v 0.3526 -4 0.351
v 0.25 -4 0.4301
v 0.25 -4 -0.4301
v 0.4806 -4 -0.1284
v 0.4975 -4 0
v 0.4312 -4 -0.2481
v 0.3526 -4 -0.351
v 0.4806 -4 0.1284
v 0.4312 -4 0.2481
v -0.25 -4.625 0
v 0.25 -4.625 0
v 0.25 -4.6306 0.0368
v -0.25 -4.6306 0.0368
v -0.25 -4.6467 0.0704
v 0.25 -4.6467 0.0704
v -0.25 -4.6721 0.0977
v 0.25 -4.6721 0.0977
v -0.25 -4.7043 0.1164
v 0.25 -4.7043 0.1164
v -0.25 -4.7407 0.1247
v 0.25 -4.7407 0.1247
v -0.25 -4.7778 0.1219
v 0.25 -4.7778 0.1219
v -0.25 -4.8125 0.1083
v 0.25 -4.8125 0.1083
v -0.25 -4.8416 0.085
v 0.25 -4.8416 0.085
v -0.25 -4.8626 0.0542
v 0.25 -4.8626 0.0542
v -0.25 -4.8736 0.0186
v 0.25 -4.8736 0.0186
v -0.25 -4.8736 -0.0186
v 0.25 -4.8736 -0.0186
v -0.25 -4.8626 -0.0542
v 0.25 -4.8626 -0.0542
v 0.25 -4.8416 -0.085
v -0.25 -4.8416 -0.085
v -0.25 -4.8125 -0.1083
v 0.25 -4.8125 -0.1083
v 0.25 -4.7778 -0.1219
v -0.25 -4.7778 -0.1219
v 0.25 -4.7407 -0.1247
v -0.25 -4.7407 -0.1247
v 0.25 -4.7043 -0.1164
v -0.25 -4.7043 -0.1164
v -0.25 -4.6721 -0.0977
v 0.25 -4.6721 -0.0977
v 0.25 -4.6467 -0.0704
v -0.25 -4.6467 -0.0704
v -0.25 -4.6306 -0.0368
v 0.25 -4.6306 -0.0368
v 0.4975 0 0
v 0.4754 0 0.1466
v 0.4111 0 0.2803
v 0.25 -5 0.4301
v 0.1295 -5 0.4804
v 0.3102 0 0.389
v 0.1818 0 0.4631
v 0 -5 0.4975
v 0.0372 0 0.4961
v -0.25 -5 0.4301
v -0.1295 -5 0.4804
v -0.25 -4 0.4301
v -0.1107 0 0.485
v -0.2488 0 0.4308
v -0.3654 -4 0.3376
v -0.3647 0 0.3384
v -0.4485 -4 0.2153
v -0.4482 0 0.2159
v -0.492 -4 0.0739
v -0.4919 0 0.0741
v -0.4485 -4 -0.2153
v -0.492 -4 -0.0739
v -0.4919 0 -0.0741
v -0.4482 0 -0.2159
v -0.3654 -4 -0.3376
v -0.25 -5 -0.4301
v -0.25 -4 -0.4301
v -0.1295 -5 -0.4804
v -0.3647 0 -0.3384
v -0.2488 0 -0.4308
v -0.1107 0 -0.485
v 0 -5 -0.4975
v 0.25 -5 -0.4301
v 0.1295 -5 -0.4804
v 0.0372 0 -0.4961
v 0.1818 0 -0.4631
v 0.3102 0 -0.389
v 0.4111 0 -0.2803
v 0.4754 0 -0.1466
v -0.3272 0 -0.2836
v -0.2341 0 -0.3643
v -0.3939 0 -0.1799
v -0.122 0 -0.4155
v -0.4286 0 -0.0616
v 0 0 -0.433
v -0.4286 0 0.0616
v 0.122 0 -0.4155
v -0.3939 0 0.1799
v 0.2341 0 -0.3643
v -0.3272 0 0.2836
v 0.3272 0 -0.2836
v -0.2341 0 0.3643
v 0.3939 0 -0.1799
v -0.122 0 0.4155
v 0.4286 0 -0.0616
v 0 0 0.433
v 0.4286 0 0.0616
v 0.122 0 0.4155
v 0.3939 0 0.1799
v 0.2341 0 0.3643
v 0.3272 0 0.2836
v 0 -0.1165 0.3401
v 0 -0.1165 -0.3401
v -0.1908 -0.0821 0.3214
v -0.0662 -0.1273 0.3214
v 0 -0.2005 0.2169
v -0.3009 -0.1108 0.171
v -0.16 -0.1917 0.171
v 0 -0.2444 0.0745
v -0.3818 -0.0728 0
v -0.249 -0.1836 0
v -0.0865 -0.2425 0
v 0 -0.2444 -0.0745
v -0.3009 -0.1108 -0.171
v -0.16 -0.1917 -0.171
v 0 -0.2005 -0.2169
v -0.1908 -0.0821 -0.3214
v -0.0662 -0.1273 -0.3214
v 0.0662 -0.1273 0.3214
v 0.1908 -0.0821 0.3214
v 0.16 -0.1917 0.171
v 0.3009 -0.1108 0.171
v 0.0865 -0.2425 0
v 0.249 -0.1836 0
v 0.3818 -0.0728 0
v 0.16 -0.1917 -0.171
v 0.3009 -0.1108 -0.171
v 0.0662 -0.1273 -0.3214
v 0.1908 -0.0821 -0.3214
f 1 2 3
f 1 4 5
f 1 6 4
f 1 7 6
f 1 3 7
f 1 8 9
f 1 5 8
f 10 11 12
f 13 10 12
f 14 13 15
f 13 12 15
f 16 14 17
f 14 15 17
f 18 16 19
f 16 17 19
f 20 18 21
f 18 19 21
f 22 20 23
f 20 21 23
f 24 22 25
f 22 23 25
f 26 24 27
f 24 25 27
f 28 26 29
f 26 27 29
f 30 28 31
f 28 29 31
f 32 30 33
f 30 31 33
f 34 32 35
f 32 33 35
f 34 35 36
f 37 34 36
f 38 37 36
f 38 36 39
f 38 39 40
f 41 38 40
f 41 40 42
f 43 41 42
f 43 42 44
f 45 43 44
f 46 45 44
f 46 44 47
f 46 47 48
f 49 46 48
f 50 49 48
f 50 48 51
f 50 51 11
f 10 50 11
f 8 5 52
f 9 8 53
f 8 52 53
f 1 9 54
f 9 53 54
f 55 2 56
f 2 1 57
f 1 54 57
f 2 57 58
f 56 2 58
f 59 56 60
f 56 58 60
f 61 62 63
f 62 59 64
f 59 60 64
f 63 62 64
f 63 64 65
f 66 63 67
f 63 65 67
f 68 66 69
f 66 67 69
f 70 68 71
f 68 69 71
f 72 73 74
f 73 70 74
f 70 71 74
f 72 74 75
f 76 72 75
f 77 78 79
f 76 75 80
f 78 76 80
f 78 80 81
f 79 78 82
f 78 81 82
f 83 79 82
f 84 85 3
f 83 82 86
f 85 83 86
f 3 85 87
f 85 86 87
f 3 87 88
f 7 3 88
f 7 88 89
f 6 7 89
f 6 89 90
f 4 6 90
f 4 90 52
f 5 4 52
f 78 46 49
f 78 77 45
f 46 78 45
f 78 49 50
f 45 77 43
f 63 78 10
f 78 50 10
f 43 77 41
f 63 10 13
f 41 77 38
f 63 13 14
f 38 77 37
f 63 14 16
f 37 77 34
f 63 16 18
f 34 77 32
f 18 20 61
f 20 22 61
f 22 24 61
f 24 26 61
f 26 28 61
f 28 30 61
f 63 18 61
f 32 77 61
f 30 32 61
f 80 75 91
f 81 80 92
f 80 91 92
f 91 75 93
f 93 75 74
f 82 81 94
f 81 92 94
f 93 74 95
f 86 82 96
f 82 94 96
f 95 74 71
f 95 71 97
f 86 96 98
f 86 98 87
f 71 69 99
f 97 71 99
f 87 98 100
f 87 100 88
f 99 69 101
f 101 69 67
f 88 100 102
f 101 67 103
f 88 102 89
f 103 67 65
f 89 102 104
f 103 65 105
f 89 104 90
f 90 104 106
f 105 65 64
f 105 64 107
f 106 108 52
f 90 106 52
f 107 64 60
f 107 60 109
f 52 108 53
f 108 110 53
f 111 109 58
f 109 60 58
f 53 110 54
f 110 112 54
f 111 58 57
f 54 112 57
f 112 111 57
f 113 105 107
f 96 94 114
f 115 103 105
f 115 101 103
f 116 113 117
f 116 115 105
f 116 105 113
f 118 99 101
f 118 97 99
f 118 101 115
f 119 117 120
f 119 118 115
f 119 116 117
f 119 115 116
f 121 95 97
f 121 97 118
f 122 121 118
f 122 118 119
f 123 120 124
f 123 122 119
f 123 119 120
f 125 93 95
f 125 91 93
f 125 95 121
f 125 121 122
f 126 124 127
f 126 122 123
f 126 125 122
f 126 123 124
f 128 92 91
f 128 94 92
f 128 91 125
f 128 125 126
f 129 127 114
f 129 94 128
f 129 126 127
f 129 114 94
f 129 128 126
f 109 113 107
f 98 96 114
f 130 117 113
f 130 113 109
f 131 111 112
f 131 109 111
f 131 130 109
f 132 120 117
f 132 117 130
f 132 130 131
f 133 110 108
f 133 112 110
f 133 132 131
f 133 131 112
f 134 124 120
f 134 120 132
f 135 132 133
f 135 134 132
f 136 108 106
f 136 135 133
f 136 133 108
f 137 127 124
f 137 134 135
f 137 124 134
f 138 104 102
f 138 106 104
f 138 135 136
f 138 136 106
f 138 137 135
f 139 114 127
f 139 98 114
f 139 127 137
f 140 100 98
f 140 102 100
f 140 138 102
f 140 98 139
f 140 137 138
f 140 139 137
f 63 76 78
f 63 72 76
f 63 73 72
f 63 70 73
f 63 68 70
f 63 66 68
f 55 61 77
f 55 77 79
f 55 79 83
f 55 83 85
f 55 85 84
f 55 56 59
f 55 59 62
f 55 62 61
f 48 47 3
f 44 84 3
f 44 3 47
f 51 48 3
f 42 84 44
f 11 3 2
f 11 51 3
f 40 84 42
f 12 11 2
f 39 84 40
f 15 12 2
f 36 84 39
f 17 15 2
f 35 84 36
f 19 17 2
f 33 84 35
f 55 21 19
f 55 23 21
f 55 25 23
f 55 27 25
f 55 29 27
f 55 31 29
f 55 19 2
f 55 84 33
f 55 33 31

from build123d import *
from build123d import SkipClean  # not in build123d's __all__

# Parameters (mm, degrees)
F0_R     = 0.4975
F1_DEPTH = 5
F2_W     = 0.6950388919
F2_H     = 1.663880872
F3_DEPTH = 1
F4_W     = 0.4926979624
F4_H     = 1.4145199916
F5_DEPTH = 1
F6_R     = 0.125
F7_DEPTH = 25


with BuildPart() as f1:
    # F0 (on Front) → F1 (new body)
    with BuildSketch(Plane.XZ):
        Circle(F0_R)
    extrude(amount=F1_DEPTH)

    # F2 (on face) → F3 (cut)
    with BuildSketch(Plane.XZ.offset(5)):
        with Locations((-0.5975194459, 0.0155332382)):
            Rectangle(F2_W, F2_H)
    extrude(amount=-F3_DEPTH, mode=Mode.SUBTRACT)

    # F4 (on face) → F5 (cut)
    with BuildSketch(Plane.XZ.offset(5)):
        with Locations((0.4963489812, -0.1099880319)):
            Rectangle(F4_W, F4_H)
    extrude(amount=-F5_DEPTH, mode=Mode.SUBTRACT)

    # F6 (on face) → F7 (cut)
    with BuildSketch(Plane.YZ.offset(0.25)):
        with Locations((-4.75, 0)):
            Circle(F6_R)
    extrude(amount=-F7_DEPTH, mode=Mode.SUBTRACT)

    # F8 (on Right) → F9 (revolve, cut)
    with BuildSketch(Plane.YZ):
        with BuildLine():
            Line((0.25, -0.5), (0.25, 0.5))
            ThreePointArc((0.25, 0.5), (-0.25, 0), (0.25, -0.5))
        make_face()
    with SkipClean():  # cleaning this boolean's faces spoils the solid; the shape is the same uncleaned
        revolve(axis=Axis((0, 0.25, 0), (0, 0, 1)), mode=Mode.SUBTRACT)


solid = f1.part
